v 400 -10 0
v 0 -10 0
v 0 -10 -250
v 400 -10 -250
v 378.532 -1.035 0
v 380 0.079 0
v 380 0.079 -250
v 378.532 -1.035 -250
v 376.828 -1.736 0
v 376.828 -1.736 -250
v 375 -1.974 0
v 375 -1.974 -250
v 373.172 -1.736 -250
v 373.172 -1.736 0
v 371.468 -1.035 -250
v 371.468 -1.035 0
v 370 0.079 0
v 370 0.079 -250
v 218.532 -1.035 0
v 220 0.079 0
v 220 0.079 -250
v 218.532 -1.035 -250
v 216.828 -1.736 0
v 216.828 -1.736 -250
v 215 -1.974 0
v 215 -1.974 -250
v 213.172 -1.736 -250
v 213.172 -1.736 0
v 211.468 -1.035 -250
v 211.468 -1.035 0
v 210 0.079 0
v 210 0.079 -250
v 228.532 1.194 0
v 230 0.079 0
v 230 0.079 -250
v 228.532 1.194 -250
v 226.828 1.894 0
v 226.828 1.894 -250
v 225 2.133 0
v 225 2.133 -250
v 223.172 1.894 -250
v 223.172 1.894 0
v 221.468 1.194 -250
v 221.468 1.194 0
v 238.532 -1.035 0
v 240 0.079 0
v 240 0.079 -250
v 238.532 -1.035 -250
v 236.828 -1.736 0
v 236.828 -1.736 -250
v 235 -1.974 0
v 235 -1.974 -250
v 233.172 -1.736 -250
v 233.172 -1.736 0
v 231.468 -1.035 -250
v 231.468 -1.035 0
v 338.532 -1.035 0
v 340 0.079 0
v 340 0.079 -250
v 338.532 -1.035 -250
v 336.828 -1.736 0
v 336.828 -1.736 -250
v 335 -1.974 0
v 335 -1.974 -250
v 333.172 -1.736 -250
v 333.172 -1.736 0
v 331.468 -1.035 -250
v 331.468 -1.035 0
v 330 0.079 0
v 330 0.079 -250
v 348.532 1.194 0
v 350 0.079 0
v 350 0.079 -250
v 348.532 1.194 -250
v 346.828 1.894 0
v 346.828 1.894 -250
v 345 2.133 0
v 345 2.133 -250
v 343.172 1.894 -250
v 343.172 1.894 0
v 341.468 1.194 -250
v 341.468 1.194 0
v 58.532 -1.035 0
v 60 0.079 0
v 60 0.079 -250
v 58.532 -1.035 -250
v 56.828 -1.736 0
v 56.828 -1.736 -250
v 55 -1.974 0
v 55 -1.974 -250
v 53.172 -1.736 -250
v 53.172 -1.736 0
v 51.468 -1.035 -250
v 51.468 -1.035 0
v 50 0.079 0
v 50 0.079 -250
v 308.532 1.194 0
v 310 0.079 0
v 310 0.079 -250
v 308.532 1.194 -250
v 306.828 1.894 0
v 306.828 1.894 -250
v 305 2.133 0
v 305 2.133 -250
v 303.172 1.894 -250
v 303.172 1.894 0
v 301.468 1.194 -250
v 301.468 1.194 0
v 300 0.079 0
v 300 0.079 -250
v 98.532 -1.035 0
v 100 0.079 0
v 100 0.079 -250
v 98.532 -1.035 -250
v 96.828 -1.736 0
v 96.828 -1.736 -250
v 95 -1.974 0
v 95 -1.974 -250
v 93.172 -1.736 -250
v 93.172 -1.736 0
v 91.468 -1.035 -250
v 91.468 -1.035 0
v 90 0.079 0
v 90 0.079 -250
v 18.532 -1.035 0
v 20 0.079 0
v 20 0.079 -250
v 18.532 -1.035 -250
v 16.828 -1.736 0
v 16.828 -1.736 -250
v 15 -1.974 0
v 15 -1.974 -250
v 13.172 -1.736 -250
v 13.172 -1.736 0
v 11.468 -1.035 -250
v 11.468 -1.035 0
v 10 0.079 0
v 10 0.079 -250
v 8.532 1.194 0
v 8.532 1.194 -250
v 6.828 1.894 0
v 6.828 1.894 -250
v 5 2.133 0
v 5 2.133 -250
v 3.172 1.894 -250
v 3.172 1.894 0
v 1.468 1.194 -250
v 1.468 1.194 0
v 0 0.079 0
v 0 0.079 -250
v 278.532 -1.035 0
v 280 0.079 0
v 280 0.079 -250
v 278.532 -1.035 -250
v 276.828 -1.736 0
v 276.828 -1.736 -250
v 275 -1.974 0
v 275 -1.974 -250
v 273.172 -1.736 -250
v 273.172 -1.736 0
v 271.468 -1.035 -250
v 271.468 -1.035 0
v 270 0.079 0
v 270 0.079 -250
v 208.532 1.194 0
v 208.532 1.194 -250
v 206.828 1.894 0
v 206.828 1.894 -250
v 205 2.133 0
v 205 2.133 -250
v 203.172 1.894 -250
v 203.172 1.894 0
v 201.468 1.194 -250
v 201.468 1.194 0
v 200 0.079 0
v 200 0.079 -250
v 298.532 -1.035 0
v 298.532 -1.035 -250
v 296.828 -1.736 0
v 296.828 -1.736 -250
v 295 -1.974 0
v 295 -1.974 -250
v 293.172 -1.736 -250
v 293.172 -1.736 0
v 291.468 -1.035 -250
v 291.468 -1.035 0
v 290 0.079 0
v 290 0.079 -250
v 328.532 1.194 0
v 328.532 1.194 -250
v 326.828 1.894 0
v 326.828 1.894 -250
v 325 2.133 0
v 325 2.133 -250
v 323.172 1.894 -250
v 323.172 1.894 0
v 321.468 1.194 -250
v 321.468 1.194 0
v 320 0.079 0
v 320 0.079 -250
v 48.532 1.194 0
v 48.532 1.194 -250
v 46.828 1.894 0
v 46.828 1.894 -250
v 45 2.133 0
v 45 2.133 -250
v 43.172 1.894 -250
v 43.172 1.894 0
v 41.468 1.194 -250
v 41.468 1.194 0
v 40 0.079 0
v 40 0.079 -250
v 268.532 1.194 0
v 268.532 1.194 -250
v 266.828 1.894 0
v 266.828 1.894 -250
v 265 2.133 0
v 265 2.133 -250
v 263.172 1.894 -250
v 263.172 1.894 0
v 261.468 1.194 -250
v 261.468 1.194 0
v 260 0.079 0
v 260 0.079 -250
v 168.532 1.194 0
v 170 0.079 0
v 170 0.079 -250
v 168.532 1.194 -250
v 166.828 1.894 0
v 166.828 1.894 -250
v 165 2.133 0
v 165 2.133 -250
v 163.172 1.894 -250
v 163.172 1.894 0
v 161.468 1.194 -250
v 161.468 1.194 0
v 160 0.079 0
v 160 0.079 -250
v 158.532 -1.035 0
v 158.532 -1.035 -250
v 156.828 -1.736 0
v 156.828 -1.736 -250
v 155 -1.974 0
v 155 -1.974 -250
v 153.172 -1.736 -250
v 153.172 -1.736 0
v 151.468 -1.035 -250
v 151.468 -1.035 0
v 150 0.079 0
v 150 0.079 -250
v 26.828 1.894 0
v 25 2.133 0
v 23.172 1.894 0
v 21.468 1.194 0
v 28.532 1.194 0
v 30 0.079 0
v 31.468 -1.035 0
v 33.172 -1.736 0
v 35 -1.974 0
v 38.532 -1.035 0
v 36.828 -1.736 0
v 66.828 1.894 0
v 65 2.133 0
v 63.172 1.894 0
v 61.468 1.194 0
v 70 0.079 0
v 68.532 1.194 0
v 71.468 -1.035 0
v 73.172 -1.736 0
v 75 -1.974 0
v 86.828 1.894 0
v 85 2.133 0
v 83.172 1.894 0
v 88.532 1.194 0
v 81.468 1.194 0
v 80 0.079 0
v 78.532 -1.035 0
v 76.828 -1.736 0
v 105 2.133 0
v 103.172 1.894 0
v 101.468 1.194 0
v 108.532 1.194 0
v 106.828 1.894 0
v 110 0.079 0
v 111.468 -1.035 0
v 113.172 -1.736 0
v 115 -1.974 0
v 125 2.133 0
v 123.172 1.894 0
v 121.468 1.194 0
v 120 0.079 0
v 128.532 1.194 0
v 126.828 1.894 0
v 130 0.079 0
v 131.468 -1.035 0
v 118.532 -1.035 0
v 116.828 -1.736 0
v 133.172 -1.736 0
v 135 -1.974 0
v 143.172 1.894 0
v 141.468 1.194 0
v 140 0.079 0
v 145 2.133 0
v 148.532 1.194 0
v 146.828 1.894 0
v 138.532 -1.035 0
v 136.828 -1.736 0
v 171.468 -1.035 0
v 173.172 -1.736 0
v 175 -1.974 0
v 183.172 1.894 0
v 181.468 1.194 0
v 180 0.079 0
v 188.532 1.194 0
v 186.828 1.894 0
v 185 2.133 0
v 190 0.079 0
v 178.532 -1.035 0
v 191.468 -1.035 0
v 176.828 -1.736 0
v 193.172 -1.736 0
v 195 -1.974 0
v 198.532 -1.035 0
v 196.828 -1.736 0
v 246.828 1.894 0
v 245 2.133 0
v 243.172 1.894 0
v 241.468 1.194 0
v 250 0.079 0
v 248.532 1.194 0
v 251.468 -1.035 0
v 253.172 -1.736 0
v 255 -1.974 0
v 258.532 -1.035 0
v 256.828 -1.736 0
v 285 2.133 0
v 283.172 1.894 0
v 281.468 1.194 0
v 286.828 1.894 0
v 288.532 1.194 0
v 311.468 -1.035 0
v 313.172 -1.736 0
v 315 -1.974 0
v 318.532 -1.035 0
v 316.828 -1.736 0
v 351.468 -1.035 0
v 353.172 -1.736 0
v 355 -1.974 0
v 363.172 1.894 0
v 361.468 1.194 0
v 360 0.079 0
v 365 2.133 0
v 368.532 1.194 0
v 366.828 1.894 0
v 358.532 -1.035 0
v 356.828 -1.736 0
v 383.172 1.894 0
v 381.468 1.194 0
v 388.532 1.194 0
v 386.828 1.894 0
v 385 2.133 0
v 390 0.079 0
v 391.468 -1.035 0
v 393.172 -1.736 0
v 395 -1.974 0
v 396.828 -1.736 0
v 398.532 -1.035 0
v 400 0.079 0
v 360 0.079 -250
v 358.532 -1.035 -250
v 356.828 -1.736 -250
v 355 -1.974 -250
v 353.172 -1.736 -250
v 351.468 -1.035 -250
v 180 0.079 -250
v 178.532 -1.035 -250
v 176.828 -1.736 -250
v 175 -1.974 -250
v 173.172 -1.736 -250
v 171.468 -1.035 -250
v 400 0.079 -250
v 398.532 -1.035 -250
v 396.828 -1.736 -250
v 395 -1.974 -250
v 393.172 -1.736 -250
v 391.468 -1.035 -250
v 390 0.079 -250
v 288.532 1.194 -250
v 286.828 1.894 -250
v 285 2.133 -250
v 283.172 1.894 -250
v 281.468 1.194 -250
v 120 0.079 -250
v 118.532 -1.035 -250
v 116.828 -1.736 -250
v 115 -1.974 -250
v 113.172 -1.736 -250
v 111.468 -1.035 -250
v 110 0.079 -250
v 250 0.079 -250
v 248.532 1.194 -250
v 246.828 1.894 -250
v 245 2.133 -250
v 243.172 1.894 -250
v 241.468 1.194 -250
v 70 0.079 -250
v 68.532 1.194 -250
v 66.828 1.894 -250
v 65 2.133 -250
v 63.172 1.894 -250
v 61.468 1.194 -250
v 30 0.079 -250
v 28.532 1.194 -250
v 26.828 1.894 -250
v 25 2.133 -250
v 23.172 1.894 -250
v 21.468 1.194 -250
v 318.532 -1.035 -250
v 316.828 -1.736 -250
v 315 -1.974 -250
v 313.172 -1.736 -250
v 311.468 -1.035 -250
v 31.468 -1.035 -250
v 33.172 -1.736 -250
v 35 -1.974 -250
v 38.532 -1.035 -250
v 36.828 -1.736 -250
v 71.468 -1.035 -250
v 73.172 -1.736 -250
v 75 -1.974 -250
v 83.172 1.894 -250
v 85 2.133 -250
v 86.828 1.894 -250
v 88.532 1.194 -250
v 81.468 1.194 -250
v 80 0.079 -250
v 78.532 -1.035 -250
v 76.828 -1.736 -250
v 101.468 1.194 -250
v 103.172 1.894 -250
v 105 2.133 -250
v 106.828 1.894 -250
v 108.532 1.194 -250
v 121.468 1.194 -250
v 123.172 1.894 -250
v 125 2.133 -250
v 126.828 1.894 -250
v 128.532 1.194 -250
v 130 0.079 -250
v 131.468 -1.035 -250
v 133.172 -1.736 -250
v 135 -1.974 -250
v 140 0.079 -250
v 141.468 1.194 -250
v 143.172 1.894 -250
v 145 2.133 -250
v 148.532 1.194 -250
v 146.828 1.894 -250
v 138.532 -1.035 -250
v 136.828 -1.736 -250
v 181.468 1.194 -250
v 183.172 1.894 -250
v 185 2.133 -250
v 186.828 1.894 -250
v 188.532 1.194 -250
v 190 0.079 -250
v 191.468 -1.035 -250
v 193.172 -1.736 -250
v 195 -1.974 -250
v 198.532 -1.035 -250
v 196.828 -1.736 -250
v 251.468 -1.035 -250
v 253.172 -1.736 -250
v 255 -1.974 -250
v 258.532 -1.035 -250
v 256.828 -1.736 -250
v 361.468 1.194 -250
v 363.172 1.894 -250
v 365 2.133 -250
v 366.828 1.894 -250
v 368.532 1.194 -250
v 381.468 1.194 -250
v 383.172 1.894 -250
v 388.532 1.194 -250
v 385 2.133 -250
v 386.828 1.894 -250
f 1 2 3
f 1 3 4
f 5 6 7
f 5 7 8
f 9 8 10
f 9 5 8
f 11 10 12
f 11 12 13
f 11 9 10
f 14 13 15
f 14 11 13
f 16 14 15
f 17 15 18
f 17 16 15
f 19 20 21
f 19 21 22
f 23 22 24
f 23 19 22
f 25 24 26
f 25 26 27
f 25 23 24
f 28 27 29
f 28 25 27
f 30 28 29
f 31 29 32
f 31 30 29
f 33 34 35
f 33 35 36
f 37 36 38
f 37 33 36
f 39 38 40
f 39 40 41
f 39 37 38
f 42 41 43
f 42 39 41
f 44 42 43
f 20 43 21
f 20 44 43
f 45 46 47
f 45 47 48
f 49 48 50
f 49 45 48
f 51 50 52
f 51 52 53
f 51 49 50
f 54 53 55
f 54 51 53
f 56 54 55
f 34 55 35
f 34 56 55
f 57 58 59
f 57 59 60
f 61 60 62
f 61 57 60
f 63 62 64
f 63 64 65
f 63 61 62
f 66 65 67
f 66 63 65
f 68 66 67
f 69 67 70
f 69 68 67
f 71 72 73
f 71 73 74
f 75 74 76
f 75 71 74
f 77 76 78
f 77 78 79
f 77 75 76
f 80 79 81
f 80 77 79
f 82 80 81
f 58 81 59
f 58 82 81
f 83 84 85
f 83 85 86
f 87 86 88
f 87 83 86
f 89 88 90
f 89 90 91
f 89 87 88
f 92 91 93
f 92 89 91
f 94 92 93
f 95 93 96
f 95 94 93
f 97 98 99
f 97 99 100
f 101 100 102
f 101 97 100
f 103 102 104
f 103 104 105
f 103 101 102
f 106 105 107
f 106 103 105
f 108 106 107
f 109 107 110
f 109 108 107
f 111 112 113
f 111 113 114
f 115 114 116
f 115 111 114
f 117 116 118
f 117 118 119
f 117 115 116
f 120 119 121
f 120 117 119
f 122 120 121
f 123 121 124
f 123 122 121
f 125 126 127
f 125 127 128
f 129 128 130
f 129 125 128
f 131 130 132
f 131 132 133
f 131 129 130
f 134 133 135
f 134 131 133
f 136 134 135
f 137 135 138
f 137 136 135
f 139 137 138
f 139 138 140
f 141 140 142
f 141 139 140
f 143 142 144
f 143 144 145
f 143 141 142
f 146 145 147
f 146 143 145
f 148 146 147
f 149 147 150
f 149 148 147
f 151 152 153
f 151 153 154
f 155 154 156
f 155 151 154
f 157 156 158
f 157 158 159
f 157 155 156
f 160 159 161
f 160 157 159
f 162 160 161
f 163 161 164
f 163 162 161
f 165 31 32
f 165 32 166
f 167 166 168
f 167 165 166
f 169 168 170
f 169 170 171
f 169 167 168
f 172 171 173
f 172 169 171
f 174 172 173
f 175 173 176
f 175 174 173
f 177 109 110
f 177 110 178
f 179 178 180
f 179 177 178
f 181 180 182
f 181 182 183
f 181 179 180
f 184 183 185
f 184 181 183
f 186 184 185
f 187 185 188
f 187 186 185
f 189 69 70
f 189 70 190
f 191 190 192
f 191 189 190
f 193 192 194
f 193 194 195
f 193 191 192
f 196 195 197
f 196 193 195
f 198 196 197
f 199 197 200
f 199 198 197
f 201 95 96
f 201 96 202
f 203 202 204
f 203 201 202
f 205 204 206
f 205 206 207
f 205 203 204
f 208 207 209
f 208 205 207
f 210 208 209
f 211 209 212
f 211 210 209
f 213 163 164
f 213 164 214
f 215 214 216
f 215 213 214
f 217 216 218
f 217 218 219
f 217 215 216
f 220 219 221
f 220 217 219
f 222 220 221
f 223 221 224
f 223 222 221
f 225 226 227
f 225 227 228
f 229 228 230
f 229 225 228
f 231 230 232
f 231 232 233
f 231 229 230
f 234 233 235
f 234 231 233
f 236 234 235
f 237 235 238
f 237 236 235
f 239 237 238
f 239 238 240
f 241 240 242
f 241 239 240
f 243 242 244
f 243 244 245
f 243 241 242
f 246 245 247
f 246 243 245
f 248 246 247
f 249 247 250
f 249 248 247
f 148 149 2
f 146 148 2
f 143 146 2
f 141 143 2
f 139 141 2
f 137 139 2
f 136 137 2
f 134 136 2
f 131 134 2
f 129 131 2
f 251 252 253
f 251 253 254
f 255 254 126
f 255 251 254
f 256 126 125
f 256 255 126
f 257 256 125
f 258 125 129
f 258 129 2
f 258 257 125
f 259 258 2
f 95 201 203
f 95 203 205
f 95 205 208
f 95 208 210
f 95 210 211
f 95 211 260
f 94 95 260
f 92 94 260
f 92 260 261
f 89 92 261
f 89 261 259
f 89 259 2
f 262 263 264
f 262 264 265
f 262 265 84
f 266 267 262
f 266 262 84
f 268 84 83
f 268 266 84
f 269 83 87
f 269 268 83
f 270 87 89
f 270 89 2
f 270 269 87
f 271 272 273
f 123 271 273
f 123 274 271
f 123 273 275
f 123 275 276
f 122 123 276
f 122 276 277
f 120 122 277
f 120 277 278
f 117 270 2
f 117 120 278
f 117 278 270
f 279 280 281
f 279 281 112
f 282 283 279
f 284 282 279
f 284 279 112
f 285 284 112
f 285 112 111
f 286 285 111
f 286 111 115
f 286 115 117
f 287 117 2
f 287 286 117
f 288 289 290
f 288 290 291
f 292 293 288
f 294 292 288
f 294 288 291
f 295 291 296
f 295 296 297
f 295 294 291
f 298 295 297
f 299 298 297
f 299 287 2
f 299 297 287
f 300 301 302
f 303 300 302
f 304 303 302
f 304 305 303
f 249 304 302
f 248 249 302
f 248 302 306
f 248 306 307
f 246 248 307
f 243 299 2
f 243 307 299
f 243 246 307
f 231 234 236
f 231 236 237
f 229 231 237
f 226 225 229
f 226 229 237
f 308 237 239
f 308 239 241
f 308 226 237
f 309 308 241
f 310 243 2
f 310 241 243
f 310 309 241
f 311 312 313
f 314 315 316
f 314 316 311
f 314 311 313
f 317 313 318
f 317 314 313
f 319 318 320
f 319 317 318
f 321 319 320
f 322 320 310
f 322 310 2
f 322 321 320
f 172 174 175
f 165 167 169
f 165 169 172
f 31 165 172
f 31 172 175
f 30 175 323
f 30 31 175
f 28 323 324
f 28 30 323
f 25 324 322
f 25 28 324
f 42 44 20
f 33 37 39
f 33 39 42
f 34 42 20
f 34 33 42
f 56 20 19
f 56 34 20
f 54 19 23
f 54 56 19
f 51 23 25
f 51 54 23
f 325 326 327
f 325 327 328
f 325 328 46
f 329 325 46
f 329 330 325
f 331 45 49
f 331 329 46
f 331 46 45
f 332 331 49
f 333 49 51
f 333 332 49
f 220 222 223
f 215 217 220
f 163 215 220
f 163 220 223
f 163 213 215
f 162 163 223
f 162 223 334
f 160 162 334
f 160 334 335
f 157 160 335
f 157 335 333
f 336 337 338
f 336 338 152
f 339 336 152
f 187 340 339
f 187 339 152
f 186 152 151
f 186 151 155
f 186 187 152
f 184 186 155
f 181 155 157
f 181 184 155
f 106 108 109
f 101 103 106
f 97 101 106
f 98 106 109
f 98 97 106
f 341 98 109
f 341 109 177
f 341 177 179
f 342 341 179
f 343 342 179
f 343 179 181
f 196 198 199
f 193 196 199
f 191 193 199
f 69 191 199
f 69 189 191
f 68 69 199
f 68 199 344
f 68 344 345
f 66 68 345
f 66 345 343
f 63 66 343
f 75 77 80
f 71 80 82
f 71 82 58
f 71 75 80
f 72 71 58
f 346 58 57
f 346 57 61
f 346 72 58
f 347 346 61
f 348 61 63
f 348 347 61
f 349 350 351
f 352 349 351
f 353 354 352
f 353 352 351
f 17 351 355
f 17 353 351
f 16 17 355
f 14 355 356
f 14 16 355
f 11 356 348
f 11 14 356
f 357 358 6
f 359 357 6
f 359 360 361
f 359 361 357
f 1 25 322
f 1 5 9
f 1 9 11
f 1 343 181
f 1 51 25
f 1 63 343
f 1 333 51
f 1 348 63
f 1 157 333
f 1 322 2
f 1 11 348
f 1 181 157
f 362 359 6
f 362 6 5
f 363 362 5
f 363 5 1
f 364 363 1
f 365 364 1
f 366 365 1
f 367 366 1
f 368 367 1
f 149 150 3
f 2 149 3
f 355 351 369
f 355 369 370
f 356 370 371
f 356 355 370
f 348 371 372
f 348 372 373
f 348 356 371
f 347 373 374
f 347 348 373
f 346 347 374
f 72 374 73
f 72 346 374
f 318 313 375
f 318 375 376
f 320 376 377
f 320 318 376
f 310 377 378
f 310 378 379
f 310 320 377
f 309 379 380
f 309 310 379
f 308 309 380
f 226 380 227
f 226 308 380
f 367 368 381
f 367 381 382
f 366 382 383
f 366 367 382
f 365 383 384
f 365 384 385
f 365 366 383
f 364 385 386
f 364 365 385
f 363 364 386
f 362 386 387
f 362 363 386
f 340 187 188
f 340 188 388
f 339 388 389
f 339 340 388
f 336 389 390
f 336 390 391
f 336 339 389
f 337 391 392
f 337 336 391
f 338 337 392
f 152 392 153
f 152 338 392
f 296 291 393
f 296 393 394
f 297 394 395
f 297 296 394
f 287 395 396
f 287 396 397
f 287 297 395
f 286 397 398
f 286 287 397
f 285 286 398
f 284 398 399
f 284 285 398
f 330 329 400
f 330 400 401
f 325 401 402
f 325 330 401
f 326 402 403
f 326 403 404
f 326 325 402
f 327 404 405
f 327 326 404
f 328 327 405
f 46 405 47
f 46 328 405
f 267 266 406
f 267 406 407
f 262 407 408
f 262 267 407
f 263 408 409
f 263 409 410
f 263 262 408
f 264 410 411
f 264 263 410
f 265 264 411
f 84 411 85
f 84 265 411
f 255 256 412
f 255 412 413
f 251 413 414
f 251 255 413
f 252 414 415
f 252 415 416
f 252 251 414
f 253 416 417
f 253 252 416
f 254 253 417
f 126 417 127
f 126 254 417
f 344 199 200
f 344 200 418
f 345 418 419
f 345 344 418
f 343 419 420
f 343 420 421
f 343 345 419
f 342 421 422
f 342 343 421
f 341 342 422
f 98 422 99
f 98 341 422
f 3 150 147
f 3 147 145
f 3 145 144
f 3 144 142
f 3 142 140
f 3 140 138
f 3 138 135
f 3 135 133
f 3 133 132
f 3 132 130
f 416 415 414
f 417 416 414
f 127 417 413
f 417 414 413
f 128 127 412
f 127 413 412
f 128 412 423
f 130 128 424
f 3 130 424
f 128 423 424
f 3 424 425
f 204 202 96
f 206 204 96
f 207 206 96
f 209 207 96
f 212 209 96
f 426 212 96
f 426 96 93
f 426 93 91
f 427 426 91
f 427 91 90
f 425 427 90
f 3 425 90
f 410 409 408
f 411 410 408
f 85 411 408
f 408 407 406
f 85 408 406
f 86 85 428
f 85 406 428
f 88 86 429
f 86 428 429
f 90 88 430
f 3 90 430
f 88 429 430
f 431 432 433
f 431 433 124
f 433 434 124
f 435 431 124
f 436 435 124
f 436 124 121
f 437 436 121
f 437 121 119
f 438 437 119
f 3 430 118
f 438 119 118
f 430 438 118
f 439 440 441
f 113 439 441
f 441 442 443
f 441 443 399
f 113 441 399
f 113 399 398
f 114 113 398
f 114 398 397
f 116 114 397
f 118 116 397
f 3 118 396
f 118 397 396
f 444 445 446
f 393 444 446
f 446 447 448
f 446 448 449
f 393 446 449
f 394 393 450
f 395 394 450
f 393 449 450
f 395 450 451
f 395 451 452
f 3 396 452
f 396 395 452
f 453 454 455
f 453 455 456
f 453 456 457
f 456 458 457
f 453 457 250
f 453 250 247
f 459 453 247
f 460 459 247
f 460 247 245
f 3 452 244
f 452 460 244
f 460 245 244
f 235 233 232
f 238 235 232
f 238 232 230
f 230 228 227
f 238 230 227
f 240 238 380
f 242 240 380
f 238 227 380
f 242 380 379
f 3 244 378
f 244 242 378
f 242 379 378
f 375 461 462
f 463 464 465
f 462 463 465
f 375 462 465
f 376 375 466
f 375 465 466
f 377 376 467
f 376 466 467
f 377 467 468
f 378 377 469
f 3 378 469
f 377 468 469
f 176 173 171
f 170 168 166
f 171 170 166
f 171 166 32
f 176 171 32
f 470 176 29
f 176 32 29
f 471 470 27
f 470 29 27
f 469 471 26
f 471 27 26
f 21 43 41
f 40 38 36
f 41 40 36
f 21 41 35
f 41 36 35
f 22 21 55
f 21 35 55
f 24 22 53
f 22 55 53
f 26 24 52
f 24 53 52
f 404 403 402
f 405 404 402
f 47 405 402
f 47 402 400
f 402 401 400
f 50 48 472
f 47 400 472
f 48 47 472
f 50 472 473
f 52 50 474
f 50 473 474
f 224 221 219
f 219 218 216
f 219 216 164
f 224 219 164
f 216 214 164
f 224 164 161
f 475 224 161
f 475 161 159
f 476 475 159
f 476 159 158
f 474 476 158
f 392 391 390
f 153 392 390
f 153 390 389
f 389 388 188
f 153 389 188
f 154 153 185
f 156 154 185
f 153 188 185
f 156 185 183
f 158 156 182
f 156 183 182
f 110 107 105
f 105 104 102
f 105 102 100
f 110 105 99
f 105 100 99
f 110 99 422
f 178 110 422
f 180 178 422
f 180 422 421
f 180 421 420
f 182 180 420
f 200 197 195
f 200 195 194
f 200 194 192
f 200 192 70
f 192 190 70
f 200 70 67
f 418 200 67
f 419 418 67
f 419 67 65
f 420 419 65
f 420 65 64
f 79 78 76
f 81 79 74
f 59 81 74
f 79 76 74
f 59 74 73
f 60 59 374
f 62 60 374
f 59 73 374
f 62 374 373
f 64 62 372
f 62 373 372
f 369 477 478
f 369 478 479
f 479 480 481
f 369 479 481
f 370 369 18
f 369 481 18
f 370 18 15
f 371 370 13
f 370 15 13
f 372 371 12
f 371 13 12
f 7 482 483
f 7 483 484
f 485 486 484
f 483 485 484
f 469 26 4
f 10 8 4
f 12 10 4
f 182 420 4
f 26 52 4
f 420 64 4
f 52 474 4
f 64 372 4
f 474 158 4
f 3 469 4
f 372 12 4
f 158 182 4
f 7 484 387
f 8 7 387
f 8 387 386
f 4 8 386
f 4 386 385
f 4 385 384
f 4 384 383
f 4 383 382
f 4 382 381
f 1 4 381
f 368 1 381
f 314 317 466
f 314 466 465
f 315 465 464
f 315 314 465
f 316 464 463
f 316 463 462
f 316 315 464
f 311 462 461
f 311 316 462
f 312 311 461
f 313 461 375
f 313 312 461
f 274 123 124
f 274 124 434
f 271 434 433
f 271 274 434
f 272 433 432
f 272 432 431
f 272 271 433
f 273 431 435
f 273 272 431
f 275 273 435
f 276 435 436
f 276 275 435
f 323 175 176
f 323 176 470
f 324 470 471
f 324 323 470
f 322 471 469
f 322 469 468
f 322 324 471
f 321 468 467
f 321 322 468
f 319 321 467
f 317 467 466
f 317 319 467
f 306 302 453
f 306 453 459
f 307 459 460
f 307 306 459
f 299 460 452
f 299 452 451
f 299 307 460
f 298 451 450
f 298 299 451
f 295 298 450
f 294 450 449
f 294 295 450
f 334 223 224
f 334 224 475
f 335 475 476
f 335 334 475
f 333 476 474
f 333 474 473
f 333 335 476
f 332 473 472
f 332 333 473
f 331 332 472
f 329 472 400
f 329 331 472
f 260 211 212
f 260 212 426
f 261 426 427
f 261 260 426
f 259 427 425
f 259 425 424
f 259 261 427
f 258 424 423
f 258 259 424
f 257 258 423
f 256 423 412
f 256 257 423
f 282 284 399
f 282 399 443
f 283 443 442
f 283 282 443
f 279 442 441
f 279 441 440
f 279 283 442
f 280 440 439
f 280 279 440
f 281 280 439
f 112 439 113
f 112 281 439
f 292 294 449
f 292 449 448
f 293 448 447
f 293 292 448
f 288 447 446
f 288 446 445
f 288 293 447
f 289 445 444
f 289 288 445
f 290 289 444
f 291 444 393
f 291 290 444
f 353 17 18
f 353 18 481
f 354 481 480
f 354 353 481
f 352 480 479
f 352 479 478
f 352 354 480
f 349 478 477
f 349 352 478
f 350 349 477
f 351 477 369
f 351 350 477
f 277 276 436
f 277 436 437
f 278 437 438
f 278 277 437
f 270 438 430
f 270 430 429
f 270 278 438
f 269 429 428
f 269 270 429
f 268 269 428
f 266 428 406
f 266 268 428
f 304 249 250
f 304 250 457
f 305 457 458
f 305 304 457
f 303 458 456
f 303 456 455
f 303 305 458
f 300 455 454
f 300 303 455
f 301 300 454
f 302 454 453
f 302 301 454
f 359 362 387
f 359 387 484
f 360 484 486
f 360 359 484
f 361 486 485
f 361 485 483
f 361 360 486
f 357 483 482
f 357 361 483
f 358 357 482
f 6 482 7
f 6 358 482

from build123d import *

# Parameters (mm, degrees)
BOSS_EXTRUDE1_DEPTH = 250


with BuildPart() as part:
    # Sketch1 → Boss-Extrude1 (new body)
    with BuildSketch(Plane.XY):
        with BuildLine():
            Line((0, 0.079324087), (0, -10))
            Line((0, -10), (400, -10))
            Line((400, -10), (400, 0.079324087))
            ThreePointArc((400, 0.079324087), (395, -1.974497919), (390, 0.079324087))
            ThreePointArc((390, 0.079324087), (385, 2.133146093), (380, 0.079324087))
            ThreePointArc((380, 0.079324087), (375, -1.974497919), (370, 0.079324087))
            ThreePointArc((370, 0.079324087), (365, 2.133146093), (360, 0.079324087))
            ThreePointArc((360, 0.079324087), (355, -1.974497919), (350, 0.079324087))
            ThreePointArc((350, 0.079324087), (345, 2.133146093), (340, 0.079324087))
            ThreePointArc((340, 0.079324087), (335, -1.974497919), (330, 0.079324087))
            ThreePointArc((330, 0.079324087), (325, 2.133146093), (320, 0.079324087))
            ThreePointArc((320, 0.079324087), (315, -1.974497919), (310, 0.079324087))
            ThreePointArc((310, 0.079324087), (305, 2.133146093), (300, 0.079324087))
            ThreePointArc((300, 0.079324087), (295, -1.974497919), (290, 0.079324087))
            ThreePointArc((290, 0.079324087), (285, 2.133146093), (280, 0.079324087))
            ThreePointArc((280, 0.079324087), (275, -1.974497919), (270, 0.079324087))
            ThreePointArc((270, 0.079324087), (265, 2.133146093), (260, 0.079324087))
            ThreePointArc((260, 0.079324087), (255, -1.974497919), (250, 0.079324087))
            ThreePointArc((250, 0.079324087), (245, 2.133146093), (240, 0.079324087))
            ThreePointArc((240, 0.079324087), (235, -1.974497919), (230, 0.079324087))
            ThreePointArc((230, 0.079324087), (225, 2.133146093), (220, 0.079324087))
            ThreePointArc((220, 0.079324087), (215, -1.974497919), (210, 0.079324087))
            ThreePointArc((210, 0.079324087), (205, 2.133146093), (200, 0.079324087))
            ThreePointArc((200, 0.079324087), (195, -1.974497919), (190, 0.079324087))
            ThreePointArc((190, 0.079324087), (185, 2.133146093), (180, 0.079324087))
            ThreePointArc((180, 0.079324087), (175, -1.974497919), (170, 0.079324087))
            ThreePointArc((170, 0.079324087), (165, 2.133146093), (160, 0.079324087))
            ThreePointArc((160, 0.079324087), (155, -1.974497919), (150, 0.079324087))
            ThreePointArc((150, 0.079324087), (145, 2.133146093), (140, 0.079324087))
            ThreePointArc((140, 0.079324087), (135, -1.974497919), (130, 0.079324087))
            ThreePointArc((130, 0.079324087), (125, 2.133146093), (120, 0.079324087))
            ThreePointArc((120, 0.079324087), (115, -1.974497919), (110, 0.079324087))
            ThreePointArc((110, 0.079324087), (105, 2.133146093), (100, 0.079324087))
            ThreePointArc((100, 0.079324087), (95, -1.974497919), (90, 0.079324087))
            ThreePointArc((90, 0.079324087), (85, 2.133146093), (80, 0.079324087))
            ThreePointArc((80, 0.079324087), (75, -1.974497919), (70, 0.079324087))
            ThreePointArc((70, 0.079324087), (65, 2.133146093), (60, 0.079324087))
            ThreePointArc((60, 0.079324087), (55, -1.974497919), (50, 0.079324087))
            ThreePointArc((50, 0.079324087), (45, 2.133146093), (40, 0.079324087))
            ThreePointArc((40, 0.079324087), (35, -1.974497919), (30, 0.079324087))
            ThreePointArc((30, 0.079324087), (25, 2.133146093), (20, 0.079324087))
            ThreePointArc((20, 0.079324087), (15, -1.974497919), (10, 0.079324087))
            ThreePointArc((10, 0.079324087), (5, 2.133146093), (0, 0.079324087))
        make_face()
    extrude(amount=-BOSS_EXTRUDE1_DEPTH)


solid = part.part
